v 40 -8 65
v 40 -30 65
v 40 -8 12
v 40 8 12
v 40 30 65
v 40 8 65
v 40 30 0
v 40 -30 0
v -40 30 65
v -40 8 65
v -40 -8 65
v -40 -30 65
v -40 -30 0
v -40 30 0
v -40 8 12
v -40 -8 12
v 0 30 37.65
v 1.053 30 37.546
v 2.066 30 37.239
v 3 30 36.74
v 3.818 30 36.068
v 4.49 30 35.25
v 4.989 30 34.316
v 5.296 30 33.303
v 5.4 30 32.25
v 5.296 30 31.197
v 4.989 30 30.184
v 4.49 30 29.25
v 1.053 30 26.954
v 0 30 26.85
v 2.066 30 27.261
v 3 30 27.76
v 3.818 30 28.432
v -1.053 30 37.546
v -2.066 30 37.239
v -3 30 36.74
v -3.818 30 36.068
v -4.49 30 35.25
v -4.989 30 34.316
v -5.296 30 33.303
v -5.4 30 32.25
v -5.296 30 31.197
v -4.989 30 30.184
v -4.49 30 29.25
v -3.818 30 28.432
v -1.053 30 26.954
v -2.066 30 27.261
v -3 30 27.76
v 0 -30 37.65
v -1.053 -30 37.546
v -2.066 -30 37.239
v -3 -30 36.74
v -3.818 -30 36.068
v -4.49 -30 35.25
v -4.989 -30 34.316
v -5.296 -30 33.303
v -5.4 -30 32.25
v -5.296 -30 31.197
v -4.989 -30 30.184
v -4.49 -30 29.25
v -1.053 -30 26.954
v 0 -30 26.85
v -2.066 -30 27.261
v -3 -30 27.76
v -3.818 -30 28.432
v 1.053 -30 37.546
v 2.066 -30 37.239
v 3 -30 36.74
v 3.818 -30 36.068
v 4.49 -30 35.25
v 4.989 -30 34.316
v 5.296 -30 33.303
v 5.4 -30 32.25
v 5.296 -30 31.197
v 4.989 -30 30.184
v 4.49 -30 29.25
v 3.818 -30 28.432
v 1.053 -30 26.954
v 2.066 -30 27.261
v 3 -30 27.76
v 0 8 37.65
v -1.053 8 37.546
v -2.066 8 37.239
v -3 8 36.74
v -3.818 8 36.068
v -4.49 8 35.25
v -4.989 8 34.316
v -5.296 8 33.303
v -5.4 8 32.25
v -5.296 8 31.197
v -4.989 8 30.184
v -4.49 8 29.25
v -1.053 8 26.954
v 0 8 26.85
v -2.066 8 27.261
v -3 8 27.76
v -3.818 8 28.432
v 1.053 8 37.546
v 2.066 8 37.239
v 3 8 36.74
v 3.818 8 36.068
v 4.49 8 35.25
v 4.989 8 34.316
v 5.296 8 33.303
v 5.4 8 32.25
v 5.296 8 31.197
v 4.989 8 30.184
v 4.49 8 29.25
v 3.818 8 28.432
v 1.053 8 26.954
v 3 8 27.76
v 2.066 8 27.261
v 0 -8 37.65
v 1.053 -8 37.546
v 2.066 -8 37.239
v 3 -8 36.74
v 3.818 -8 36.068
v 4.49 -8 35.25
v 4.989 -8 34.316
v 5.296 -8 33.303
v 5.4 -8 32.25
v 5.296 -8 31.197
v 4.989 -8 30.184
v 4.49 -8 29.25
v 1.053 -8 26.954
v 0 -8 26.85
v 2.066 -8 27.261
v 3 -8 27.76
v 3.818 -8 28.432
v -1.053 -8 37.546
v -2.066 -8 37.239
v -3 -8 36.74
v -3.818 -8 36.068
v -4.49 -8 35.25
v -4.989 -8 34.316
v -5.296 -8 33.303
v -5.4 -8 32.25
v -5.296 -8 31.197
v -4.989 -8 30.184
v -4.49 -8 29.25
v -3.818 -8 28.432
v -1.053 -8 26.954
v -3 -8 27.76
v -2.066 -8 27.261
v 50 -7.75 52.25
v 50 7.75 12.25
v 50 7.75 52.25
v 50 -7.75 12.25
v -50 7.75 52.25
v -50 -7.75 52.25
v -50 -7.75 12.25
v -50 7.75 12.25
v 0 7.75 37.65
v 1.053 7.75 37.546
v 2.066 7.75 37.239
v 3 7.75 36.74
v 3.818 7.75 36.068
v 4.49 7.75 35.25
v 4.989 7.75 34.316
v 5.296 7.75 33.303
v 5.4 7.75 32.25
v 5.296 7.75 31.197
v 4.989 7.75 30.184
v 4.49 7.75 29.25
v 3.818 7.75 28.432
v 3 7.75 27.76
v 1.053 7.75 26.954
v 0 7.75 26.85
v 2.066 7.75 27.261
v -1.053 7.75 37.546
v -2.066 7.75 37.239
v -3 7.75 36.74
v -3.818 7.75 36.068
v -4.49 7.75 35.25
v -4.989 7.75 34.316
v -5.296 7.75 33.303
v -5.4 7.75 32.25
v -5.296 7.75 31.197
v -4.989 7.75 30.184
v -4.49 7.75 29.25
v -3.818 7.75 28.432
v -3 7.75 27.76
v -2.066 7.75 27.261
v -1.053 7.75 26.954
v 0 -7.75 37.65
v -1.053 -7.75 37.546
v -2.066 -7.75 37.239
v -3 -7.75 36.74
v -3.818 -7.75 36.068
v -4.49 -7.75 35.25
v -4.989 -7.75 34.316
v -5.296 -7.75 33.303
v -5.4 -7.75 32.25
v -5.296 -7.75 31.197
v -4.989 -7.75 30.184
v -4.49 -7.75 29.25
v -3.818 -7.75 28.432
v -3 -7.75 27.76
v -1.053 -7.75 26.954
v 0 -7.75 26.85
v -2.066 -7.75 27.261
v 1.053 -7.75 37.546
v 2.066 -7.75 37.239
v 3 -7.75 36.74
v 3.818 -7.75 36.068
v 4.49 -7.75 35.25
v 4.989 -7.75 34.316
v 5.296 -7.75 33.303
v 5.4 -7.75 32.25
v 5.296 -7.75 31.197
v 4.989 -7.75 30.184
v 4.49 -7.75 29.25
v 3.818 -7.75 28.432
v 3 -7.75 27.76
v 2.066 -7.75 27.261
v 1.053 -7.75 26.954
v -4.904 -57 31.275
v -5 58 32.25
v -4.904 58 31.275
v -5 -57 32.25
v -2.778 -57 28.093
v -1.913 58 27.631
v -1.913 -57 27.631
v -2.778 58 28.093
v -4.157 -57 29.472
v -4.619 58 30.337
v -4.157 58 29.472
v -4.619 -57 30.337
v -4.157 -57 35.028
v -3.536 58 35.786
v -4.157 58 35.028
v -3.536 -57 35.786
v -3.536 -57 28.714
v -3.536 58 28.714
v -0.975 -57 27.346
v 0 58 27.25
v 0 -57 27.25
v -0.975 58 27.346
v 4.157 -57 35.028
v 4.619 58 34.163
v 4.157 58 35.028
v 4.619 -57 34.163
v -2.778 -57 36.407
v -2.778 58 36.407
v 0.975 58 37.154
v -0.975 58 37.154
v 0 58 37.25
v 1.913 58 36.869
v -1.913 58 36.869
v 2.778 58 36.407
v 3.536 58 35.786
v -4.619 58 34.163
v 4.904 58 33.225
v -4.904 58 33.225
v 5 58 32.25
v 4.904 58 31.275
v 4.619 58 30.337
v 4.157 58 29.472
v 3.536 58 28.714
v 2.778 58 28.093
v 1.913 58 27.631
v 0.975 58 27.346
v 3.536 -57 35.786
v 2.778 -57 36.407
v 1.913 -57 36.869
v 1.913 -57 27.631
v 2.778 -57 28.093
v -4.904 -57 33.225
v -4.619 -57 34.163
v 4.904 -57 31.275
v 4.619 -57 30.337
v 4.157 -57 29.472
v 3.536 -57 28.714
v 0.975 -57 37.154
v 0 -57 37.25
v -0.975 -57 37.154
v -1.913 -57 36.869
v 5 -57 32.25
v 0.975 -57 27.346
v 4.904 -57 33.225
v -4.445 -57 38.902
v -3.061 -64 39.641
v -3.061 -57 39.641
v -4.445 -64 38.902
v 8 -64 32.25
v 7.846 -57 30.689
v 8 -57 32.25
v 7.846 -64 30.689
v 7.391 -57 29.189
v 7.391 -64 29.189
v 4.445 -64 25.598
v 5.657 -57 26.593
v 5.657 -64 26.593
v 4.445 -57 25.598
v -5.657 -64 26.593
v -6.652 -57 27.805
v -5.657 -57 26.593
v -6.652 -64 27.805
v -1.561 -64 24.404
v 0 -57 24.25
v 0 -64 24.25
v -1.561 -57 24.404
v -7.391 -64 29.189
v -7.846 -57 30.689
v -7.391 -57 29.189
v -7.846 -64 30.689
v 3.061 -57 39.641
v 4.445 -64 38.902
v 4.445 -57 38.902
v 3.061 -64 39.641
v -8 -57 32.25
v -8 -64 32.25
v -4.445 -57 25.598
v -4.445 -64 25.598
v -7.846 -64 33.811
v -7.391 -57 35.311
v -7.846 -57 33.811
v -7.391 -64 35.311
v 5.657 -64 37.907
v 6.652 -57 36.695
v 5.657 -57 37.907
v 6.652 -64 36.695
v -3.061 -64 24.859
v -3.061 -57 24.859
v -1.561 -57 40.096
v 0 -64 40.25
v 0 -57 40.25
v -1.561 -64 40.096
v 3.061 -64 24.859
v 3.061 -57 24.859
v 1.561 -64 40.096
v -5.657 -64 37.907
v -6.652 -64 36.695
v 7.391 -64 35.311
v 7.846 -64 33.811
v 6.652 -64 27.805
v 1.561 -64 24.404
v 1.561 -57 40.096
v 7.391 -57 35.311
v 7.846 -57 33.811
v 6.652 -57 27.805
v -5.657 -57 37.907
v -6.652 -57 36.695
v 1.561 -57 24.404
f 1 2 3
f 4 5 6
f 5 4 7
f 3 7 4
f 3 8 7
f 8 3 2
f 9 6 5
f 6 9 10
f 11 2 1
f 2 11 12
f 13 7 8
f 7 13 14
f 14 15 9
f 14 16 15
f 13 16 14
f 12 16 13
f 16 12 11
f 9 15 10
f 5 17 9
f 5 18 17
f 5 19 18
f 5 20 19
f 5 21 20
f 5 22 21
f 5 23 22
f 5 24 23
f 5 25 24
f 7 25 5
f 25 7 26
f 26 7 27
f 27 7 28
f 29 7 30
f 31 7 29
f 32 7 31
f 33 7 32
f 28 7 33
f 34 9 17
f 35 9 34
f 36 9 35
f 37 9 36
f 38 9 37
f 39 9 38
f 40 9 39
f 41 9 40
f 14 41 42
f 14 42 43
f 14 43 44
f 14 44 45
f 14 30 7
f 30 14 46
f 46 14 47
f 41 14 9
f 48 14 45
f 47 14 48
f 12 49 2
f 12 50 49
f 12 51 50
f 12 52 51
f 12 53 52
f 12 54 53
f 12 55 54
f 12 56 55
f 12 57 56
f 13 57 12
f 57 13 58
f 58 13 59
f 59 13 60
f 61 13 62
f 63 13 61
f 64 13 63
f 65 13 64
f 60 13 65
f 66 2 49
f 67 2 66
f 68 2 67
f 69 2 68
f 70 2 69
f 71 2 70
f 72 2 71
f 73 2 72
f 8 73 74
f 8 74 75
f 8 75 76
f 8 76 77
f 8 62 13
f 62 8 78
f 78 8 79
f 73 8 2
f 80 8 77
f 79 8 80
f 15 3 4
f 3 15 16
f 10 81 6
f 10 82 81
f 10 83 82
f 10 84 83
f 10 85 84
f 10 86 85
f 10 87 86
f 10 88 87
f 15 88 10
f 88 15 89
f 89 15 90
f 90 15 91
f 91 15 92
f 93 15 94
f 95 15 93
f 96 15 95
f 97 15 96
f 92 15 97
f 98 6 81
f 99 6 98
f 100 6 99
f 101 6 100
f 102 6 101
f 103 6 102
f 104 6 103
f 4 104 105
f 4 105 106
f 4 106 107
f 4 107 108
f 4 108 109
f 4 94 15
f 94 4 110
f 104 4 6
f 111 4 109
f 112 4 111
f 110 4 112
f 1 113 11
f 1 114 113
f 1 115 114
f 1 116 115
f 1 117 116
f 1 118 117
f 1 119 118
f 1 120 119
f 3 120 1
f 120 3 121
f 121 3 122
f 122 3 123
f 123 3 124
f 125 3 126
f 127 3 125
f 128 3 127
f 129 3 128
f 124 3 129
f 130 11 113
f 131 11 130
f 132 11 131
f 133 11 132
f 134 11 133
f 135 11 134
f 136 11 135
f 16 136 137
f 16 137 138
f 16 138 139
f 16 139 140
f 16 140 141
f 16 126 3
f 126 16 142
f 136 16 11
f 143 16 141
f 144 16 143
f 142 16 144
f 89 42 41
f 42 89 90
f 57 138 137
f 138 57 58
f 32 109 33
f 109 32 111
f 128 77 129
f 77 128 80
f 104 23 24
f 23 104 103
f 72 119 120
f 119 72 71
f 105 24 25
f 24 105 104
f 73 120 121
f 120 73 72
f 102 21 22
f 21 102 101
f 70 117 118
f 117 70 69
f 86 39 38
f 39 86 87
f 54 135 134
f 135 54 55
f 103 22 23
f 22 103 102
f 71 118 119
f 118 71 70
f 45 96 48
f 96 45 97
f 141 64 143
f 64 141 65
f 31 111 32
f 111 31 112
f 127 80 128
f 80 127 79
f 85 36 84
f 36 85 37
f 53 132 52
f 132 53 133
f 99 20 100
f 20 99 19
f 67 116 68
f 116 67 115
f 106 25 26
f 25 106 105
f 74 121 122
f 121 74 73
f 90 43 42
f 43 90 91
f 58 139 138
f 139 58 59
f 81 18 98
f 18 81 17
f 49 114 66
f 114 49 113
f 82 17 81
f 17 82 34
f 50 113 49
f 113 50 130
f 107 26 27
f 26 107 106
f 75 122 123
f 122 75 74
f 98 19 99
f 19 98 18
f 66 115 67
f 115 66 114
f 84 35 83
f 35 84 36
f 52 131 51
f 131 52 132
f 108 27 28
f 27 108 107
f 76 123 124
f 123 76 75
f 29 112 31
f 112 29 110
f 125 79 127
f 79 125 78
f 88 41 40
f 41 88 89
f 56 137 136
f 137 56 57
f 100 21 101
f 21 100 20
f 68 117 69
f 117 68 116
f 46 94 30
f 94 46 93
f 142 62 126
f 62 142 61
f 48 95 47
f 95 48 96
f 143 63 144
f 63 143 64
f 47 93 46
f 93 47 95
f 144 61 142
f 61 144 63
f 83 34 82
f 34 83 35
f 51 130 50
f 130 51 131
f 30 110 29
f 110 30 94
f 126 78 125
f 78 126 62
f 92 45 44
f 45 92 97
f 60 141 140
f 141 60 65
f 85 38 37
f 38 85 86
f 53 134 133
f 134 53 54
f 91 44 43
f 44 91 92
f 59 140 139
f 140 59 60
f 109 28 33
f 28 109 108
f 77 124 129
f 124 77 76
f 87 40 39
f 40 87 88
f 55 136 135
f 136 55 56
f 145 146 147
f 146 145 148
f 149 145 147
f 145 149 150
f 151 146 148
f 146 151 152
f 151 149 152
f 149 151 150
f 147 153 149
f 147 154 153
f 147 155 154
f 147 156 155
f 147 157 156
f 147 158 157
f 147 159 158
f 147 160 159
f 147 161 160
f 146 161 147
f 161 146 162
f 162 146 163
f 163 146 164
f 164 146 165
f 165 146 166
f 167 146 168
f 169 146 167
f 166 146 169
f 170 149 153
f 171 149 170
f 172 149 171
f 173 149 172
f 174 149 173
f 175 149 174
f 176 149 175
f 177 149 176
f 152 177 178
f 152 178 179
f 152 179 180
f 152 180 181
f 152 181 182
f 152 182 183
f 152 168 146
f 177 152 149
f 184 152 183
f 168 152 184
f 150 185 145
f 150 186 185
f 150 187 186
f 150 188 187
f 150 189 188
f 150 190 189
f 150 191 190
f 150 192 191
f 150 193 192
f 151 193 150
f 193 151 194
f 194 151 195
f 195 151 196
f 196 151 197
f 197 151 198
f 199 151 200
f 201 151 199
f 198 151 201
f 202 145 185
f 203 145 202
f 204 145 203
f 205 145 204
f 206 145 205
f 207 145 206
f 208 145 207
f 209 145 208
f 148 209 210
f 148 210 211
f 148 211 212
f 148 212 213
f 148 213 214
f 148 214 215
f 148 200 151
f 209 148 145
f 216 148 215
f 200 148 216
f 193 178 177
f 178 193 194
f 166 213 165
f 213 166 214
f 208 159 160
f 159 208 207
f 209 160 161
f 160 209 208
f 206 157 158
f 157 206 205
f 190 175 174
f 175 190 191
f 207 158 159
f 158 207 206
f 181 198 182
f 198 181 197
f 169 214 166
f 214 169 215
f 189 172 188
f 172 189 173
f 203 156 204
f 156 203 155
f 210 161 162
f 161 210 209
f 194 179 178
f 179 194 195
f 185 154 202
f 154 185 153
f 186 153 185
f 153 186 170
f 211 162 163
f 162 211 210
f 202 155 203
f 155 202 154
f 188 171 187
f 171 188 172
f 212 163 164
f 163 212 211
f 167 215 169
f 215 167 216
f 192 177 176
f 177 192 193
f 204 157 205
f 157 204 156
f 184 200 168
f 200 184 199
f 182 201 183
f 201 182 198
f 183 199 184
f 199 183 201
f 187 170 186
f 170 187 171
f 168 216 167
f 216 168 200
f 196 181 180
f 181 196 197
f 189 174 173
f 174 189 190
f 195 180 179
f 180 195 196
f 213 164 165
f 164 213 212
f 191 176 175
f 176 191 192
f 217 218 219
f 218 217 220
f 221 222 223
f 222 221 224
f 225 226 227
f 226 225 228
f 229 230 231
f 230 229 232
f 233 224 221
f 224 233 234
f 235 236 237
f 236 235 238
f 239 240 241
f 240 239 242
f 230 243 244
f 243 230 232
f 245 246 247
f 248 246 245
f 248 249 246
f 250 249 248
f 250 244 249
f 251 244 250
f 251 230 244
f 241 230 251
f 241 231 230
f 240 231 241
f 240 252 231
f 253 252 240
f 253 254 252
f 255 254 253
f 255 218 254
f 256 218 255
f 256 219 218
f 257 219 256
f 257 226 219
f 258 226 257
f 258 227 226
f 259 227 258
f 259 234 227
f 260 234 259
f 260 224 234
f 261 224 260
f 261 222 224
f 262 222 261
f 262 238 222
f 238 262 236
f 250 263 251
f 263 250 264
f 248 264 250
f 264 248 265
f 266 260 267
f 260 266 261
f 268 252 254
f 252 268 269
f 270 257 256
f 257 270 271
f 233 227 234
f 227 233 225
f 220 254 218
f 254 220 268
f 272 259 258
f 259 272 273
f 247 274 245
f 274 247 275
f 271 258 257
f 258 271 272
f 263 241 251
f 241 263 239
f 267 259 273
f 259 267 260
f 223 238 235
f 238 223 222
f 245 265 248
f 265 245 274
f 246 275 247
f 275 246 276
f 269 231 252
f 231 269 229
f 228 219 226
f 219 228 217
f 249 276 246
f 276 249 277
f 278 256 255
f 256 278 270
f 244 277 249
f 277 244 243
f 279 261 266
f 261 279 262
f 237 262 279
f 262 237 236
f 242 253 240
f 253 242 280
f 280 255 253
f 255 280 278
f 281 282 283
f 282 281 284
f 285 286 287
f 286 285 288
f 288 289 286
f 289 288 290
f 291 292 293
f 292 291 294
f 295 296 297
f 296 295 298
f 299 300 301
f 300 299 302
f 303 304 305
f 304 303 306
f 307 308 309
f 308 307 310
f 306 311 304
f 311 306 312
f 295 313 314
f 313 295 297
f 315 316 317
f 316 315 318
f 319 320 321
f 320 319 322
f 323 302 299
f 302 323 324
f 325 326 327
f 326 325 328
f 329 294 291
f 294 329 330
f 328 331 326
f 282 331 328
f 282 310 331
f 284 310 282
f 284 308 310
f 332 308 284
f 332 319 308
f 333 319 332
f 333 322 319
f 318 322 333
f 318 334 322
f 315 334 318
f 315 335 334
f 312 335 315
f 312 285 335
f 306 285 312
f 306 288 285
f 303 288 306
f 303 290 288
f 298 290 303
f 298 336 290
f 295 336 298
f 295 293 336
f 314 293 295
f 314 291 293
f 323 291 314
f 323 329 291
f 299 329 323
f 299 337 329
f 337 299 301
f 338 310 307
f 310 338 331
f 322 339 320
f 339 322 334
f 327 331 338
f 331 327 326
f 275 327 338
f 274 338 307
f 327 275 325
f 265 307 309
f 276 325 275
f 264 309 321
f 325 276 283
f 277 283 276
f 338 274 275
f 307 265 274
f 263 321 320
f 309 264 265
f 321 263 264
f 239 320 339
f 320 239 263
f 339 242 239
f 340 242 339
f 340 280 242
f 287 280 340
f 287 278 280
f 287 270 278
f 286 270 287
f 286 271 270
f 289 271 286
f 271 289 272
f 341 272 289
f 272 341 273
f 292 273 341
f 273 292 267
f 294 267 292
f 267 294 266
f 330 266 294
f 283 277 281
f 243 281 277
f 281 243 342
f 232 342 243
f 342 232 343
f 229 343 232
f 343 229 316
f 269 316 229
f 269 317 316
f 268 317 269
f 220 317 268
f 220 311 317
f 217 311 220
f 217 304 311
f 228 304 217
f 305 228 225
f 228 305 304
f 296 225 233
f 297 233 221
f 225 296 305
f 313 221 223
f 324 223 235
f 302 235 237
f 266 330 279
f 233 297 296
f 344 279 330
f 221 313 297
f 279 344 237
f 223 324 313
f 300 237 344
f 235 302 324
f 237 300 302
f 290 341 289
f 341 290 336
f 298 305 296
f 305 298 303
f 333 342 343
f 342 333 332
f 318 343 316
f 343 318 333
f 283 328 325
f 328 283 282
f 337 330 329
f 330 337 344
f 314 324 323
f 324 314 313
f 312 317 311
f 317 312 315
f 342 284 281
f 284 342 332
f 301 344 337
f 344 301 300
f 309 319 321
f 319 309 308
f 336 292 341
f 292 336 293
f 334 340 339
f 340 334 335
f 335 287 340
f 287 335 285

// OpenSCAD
$fn = 32;

// ------------------------------------------------------------------------
// Clevis joint: 80 mm clevis, pin d10
// Every part is its own module, assembly() places them once.
// ------------------------------------------------------------------------

// --- part 1 ---
module clevis() {
  difference() {
    translate([-40, -30, 0]) cube([80, 60, 65]);
    translate([-41, -8, 12]) cube([82, 16, 54]);
    translate([0, 0, 32.25]) rotate([90, 0, 0]) cylinder(h = 62, d = 10.8, center = true);
  }
}

// --- part 2 ---
module eye() {
  difference() {
    translate([-50, -7.75, 0]) cube([100, 15.5, 40]);
    translate([0, 0, 20]) rotate([90, 0, 0]) cylinder(h = 17.5, d = 10.8, center = true);
  }
}

// --- part 3 ---
module pin() {
  rotate([0, 90, 0]) cylinder(h = 116, d = 10, center = true);
  translate([-64, 0, 0]) rotate([0, 90, 0]) cylinder(h = 7, d = 16);
}

// --- assembly ---
module assembly() {
  translate([0, 0, 0]) rotate([0, 0, 0]) clevis();
  translate([0, 0, 12.25]) rotate([0, 0, 0]) eye();
  translate([0, 0, 32.25]) rotate([0, 0, 90]) pin();
}

assembly();
